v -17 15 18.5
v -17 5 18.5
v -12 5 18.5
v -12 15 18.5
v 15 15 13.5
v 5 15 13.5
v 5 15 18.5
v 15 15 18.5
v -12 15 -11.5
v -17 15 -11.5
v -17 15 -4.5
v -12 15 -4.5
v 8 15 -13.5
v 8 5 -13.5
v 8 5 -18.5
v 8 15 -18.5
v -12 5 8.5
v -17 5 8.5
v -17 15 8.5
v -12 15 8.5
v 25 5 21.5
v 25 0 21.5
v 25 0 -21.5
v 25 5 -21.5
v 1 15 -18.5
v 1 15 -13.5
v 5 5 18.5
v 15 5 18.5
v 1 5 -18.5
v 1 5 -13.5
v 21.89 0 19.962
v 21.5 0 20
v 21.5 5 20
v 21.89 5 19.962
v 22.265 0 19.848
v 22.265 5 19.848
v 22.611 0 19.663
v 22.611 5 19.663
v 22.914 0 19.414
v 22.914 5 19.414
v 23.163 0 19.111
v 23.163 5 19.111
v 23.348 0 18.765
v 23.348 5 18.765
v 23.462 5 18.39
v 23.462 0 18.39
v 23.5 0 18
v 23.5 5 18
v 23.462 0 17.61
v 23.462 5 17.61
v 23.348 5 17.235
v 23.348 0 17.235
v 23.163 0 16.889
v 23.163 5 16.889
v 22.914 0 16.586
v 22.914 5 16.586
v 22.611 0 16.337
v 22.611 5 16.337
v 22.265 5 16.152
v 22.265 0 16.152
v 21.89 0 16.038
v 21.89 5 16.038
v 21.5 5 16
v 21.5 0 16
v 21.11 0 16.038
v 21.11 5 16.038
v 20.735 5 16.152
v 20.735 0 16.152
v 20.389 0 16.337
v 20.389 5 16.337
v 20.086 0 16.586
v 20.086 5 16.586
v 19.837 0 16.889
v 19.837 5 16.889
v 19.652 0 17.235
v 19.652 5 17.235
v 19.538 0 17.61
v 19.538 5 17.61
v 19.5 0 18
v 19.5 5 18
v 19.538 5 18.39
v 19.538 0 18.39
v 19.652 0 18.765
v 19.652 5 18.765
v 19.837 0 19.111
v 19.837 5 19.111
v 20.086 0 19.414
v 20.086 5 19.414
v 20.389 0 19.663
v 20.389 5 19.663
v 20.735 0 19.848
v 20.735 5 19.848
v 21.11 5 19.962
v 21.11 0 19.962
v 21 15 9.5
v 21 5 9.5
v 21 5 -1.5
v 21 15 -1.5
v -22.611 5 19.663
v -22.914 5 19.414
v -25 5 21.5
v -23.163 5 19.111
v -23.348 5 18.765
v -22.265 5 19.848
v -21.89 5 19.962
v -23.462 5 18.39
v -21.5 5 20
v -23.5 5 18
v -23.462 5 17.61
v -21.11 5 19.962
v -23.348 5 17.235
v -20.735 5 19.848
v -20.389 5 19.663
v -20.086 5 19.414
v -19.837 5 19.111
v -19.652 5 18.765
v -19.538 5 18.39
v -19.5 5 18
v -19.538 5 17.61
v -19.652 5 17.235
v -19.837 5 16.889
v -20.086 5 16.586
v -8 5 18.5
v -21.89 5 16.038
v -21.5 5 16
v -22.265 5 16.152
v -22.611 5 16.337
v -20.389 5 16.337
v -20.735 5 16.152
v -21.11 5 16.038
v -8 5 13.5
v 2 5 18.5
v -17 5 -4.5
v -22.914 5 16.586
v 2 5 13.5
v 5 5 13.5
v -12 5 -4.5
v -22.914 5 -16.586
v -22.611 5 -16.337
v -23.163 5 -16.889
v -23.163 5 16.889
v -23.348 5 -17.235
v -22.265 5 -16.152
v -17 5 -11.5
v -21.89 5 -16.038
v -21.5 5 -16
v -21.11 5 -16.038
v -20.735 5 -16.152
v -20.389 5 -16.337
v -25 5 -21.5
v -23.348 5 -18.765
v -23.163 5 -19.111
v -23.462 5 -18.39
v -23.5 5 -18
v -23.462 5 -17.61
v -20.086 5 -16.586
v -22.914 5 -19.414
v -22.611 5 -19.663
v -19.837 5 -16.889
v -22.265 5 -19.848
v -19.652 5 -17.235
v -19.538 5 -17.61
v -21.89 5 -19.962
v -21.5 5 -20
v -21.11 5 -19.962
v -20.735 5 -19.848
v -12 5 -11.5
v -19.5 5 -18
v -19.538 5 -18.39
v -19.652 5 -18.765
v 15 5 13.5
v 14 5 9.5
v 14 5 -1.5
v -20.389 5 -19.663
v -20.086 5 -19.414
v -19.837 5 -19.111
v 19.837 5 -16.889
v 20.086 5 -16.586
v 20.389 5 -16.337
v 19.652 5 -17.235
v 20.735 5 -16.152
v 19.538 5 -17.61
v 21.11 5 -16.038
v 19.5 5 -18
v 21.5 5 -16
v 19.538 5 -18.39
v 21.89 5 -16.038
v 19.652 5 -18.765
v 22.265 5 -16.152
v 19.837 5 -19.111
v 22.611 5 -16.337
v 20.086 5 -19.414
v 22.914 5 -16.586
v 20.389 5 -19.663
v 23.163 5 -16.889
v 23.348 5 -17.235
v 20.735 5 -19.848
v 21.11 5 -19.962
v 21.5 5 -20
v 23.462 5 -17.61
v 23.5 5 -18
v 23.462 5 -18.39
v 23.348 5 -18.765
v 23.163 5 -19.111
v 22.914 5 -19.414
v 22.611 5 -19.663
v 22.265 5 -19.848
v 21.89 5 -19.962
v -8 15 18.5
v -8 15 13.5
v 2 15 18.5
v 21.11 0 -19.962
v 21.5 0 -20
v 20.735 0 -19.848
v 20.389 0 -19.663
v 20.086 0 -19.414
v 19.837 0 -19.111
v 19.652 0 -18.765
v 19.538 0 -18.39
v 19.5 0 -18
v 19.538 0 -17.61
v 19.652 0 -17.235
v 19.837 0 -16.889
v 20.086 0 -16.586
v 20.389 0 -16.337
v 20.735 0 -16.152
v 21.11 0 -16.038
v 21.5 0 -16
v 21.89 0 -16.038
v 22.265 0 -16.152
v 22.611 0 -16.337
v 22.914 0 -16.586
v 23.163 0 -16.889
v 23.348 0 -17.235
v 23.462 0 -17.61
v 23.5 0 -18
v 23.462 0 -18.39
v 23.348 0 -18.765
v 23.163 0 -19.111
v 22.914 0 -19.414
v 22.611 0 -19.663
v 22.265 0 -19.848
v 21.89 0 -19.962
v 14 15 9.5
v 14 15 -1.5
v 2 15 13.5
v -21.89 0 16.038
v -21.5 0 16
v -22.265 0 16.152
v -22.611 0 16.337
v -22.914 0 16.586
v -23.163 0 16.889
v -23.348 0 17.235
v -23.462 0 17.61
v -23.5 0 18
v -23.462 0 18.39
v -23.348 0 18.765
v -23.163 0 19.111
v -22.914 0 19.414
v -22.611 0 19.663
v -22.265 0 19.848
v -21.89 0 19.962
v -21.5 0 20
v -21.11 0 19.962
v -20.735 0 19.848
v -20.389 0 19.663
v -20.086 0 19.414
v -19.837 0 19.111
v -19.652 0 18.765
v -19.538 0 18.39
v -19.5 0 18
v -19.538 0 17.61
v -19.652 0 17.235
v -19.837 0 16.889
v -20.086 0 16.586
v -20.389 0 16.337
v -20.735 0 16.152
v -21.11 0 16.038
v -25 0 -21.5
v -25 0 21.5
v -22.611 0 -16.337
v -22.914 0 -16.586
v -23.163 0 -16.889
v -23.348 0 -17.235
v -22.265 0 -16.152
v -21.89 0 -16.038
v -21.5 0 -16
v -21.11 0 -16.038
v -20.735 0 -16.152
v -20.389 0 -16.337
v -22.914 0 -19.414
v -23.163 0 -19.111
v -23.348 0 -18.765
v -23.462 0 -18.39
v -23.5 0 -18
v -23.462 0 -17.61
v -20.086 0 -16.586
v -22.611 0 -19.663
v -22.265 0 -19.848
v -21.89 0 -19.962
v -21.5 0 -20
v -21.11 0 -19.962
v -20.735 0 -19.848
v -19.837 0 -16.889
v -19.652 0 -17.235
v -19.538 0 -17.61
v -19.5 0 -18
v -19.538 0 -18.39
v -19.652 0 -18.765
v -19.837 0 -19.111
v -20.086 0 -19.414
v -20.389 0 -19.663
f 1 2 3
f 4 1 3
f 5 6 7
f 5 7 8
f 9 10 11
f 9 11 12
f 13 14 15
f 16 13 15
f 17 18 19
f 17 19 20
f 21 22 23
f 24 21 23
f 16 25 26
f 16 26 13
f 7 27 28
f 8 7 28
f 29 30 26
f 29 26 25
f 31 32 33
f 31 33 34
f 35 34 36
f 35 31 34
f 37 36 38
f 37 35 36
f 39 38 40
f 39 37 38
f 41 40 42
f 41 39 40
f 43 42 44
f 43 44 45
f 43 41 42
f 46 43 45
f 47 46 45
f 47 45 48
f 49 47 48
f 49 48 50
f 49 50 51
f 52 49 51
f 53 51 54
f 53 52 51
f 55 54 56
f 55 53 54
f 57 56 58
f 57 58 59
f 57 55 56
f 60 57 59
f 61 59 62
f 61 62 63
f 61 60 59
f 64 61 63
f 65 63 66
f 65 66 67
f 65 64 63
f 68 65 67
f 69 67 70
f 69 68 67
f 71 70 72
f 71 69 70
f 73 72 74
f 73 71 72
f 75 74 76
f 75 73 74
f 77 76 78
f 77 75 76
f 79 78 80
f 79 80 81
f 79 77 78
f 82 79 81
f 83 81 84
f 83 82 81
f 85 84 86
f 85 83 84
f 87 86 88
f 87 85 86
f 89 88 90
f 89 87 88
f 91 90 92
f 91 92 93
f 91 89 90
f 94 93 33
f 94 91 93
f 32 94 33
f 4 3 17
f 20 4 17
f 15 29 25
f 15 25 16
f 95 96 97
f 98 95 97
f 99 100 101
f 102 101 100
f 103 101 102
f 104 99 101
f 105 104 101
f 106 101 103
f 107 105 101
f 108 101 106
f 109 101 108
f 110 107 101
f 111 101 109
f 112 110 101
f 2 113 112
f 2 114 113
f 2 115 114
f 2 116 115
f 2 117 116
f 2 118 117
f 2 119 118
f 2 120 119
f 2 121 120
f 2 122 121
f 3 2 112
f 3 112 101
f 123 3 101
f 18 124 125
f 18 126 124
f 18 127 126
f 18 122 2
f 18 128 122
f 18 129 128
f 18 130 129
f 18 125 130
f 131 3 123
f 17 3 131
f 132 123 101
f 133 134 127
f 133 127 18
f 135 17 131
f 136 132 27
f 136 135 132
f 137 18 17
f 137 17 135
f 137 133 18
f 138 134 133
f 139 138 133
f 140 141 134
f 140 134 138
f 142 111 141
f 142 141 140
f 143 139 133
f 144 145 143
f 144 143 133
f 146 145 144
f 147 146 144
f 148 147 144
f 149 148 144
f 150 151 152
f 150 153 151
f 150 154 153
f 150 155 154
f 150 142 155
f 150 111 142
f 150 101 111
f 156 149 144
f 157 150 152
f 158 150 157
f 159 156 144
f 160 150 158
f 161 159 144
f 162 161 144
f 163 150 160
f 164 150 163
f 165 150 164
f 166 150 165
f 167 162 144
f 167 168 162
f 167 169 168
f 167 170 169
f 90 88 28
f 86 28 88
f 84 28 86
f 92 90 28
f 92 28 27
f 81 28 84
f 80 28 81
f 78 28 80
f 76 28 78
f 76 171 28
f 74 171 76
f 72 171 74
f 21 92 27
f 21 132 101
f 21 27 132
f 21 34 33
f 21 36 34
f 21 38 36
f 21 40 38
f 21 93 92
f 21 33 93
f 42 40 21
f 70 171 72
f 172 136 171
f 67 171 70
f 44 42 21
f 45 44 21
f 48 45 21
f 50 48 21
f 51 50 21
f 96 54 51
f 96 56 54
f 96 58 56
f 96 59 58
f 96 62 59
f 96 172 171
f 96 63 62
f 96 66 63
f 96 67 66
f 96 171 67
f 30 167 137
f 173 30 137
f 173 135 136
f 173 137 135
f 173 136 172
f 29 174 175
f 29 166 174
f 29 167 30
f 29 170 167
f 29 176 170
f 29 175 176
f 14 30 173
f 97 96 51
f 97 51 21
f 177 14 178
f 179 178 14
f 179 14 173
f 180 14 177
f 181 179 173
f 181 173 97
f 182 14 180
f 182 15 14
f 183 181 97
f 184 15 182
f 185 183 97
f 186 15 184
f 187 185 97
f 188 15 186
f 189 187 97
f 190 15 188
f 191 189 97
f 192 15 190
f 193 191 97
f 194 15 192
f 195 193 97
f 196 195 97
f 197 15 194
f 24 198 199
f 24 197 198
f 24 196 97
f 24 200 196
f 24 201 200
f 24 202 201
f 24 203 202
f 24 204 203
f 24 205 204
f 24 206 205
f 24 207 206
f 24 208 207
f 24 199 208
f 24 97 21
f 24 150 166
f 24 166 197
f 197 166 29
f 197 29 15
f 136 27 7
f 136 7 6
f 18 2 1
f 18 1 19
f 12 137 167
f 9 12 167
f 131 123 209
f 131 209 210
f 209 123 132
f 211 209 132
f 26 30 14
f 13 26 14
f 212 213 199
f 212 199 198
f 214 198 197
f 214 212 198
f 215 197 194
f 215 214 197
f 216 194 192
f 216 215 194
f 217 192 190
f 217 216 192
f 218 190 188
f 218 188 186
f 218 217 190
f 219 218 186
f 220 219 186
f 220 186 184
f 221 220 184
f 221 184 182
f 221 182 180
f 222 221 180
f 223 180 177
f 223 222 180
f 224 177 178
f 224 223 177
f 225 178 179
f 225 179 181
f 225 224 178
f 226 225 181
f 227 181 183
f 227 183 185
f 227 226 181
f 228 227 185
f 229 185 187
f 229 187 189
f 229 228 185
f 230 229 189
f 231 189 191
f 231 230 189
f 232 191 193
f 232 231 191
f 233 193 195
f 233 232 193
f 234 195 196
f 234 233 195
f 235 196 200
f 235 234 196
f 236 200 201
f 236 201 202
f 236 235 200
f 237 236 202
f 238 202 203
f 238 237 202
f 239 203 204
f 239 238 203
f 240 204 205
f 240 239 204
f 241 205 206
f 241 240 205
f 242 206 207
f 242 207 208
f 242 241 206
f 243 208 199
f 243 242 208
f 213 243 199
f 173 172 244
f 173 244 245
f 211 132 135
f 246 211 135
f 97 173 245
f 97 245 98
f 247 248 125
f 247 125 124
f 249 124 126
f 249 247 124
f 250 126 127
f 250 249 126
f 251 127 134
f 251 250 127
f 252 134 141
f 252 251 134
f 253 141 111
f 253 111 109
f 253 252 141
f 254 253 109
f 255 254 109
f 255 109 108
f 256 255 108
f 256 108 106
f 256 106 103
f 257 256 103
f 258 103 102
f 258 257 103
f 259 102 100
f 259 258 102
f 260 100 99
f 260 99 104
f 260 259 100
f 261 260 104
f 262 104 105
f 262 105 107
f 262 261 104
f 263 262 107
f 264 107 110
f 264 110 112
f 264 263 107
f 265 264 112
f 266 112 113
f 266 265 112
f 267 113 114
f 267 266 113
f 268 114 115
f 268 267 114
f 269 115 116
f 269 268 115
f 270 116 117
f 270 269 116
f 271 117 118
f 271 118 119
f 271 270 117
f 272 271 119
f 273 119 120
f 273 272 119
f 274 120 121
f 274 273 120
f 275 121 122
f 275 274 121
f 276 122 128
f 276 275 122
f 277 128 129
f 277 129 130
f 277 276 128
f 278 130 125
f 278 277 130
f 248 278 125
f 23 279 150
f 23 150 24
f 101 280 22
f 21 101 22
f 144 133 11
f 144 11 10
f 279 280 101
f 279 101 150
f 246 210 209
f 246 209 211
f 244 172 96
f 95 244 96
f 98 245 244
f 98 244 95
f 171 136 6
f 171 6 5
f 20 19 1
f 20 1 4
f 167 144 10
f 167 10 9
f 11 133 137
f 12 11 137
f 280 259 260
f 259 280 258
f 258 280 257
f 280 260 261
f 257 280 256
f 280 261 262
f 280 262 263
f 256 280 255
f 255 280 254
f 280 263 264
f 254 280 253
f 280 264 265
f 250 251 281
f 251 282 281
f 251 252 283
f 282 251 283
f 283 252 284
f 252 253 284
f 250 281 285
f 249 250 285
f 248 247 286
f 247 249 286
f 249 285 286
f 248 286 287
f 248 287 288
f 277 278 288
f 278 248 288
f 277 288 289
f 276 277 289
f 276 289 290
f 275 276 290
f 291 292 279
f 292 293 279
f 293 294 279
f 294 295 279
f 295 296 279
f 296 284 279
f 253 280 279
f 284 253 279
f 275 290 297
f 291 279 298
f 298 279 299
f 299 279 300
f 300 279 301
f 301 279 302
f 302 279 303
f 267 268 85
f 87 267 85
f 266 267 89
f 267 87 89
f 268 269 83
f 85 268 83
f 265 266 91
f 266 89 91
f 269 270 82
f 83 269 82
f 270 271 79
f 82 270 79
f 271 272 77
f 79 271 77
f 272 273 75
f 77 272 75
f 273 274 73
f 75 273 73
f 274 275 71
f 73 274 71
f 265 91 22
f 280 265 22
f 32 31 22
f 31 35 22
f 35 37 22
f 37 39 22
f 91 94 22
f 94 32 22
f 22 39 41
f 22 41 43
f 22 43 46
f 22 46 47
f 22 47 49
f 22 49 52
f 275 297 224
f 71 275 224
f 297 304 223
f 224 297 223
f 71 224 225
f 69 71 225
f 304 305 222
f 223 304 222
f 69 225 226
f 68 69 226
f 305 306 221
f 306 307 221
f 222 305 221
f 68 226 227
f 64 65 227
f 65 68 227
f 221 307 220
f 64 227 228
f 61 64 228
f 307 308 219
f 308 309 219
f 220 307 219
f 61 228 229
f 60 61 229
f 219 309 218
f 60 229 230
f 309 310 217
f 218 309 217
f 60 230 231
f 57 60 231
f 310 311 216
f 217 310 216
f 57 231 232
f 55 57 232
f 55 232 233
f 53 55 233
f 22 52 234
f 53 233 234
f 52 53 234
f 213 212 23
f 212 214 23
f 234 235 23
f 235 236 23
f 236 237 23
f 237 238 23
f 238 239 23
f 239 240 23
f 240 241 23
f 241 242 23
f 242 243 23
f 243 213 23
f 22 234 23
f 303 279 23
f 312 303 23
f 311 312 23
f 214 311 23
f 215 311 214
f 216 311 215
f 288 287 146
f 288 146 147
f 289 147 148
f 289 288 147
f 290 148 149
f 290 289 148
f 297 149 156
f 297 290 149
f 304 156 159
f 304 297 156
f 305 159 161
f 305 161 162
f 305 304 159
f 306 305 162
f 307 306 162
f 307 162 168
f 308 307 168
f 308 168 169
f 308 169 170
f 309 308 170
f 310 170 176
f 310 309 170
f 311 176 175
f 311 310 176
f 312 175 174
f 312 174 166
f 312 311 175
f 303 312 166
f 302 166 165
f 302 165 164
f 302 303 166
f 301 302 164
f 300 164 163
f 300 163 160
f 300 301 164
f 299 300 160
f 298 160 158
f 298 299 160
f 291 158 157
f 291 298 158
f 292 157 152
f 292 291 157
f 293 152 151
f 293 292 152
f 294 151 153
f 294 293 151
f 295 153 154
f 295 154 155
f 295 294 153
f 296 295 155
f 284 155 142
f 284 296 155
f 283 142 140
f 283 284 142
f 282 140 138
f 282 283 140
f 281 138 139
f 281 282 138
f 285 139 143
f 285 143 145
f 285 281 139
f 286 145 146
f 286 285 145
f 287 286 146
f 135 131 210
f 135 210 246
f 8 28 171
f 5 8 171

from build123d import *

# Parameters (mm, degrees)
ESQUISSE1_W        = 50
ESQUISSE1_H        = 43
ESQUISSE1_R        = 2
BOSS_EXTRU_1_DEPTH = 5
ESQUISSE2_W        = 5
ESQUISSE2_H        = 10
ESQUISSE2_H_2      = 7
ESQUISSE2_W_2      = 7
ESQUISSE2_H_3      = 5
ESQUISSE2_H_4      = 11
ESQUISSE2_W_3      = 10
BOSS_EXTRU_2_DEPTH = 15


with BuildPart() as part:
    # Esquisse1 → Boss.-Extru.1 (new body)
    with BuildSketch(Plane(origin=(0, 0, 0), x_dir=(1, 0, 0), z_dir=(0, 1, 0))):
        Rectangle(ESQUISSE1_W, ESQUISSE1_H)
        with Locations(Location((-21.5, 18, 0), (0, 0, 270))):
            Circle(ESQUISSE1_R, mode=Mode.SUBTRACT)
        with Locations(Location((21.5, 18, 0), (0, 0, 90))):
            Circle(ESQUISSE1_R, mode=Mode.SUBTRACT)
        with Locations(Location((21.5, -18, 0), (0, 0, 270))):
            Circle(ESQUISSE1_R, mode=Mode.SUBTRACT)
        with Locations(Location((-21.5, -18, 0), (0, 0, 90))):
            Circle(ESQUISSE1_R, mode=Mode.SUBTRACT)
    extrude(amount=BOSS_EXTRU_1_DEPTH)

    # Esquisse2 → Boss.-Extru.2 (add)
    with BuildSketch(Plane(origin=(0, 0, 0), x_dir=(1, 0, 0), z_dir=(0, 1, 0))):
        with Locations((-14.5, -13.5)):
            Rectangle(ESQUISSE2_W, ESQUISSE2_H)
        with Locations((-14.5, 8)):
            Rectangle(ESQUISSE2_W, ESQUISSE2_H_2)
        with Locations((4.5, 16)):
            Rectangle(ESQUISSE2_W_2, ESQUISSE2_H_3)
        with Locations((17.5, -4)):
            Rectangle(ESQUISSE2_W_2, ESQUISSE2_H_4)
        with Locations((10, -16)):
            Rectangle(ESQUISSE2_W_3, ESQUISSE2_H_3)
        with Locations((-3, -16)):
            Rectangle(ESQUISSE2_W_3, ESQUISSE2_H_3)
    extrude(amount=BOSS_EXTRU_2_DEPTH)


solid = part.part
